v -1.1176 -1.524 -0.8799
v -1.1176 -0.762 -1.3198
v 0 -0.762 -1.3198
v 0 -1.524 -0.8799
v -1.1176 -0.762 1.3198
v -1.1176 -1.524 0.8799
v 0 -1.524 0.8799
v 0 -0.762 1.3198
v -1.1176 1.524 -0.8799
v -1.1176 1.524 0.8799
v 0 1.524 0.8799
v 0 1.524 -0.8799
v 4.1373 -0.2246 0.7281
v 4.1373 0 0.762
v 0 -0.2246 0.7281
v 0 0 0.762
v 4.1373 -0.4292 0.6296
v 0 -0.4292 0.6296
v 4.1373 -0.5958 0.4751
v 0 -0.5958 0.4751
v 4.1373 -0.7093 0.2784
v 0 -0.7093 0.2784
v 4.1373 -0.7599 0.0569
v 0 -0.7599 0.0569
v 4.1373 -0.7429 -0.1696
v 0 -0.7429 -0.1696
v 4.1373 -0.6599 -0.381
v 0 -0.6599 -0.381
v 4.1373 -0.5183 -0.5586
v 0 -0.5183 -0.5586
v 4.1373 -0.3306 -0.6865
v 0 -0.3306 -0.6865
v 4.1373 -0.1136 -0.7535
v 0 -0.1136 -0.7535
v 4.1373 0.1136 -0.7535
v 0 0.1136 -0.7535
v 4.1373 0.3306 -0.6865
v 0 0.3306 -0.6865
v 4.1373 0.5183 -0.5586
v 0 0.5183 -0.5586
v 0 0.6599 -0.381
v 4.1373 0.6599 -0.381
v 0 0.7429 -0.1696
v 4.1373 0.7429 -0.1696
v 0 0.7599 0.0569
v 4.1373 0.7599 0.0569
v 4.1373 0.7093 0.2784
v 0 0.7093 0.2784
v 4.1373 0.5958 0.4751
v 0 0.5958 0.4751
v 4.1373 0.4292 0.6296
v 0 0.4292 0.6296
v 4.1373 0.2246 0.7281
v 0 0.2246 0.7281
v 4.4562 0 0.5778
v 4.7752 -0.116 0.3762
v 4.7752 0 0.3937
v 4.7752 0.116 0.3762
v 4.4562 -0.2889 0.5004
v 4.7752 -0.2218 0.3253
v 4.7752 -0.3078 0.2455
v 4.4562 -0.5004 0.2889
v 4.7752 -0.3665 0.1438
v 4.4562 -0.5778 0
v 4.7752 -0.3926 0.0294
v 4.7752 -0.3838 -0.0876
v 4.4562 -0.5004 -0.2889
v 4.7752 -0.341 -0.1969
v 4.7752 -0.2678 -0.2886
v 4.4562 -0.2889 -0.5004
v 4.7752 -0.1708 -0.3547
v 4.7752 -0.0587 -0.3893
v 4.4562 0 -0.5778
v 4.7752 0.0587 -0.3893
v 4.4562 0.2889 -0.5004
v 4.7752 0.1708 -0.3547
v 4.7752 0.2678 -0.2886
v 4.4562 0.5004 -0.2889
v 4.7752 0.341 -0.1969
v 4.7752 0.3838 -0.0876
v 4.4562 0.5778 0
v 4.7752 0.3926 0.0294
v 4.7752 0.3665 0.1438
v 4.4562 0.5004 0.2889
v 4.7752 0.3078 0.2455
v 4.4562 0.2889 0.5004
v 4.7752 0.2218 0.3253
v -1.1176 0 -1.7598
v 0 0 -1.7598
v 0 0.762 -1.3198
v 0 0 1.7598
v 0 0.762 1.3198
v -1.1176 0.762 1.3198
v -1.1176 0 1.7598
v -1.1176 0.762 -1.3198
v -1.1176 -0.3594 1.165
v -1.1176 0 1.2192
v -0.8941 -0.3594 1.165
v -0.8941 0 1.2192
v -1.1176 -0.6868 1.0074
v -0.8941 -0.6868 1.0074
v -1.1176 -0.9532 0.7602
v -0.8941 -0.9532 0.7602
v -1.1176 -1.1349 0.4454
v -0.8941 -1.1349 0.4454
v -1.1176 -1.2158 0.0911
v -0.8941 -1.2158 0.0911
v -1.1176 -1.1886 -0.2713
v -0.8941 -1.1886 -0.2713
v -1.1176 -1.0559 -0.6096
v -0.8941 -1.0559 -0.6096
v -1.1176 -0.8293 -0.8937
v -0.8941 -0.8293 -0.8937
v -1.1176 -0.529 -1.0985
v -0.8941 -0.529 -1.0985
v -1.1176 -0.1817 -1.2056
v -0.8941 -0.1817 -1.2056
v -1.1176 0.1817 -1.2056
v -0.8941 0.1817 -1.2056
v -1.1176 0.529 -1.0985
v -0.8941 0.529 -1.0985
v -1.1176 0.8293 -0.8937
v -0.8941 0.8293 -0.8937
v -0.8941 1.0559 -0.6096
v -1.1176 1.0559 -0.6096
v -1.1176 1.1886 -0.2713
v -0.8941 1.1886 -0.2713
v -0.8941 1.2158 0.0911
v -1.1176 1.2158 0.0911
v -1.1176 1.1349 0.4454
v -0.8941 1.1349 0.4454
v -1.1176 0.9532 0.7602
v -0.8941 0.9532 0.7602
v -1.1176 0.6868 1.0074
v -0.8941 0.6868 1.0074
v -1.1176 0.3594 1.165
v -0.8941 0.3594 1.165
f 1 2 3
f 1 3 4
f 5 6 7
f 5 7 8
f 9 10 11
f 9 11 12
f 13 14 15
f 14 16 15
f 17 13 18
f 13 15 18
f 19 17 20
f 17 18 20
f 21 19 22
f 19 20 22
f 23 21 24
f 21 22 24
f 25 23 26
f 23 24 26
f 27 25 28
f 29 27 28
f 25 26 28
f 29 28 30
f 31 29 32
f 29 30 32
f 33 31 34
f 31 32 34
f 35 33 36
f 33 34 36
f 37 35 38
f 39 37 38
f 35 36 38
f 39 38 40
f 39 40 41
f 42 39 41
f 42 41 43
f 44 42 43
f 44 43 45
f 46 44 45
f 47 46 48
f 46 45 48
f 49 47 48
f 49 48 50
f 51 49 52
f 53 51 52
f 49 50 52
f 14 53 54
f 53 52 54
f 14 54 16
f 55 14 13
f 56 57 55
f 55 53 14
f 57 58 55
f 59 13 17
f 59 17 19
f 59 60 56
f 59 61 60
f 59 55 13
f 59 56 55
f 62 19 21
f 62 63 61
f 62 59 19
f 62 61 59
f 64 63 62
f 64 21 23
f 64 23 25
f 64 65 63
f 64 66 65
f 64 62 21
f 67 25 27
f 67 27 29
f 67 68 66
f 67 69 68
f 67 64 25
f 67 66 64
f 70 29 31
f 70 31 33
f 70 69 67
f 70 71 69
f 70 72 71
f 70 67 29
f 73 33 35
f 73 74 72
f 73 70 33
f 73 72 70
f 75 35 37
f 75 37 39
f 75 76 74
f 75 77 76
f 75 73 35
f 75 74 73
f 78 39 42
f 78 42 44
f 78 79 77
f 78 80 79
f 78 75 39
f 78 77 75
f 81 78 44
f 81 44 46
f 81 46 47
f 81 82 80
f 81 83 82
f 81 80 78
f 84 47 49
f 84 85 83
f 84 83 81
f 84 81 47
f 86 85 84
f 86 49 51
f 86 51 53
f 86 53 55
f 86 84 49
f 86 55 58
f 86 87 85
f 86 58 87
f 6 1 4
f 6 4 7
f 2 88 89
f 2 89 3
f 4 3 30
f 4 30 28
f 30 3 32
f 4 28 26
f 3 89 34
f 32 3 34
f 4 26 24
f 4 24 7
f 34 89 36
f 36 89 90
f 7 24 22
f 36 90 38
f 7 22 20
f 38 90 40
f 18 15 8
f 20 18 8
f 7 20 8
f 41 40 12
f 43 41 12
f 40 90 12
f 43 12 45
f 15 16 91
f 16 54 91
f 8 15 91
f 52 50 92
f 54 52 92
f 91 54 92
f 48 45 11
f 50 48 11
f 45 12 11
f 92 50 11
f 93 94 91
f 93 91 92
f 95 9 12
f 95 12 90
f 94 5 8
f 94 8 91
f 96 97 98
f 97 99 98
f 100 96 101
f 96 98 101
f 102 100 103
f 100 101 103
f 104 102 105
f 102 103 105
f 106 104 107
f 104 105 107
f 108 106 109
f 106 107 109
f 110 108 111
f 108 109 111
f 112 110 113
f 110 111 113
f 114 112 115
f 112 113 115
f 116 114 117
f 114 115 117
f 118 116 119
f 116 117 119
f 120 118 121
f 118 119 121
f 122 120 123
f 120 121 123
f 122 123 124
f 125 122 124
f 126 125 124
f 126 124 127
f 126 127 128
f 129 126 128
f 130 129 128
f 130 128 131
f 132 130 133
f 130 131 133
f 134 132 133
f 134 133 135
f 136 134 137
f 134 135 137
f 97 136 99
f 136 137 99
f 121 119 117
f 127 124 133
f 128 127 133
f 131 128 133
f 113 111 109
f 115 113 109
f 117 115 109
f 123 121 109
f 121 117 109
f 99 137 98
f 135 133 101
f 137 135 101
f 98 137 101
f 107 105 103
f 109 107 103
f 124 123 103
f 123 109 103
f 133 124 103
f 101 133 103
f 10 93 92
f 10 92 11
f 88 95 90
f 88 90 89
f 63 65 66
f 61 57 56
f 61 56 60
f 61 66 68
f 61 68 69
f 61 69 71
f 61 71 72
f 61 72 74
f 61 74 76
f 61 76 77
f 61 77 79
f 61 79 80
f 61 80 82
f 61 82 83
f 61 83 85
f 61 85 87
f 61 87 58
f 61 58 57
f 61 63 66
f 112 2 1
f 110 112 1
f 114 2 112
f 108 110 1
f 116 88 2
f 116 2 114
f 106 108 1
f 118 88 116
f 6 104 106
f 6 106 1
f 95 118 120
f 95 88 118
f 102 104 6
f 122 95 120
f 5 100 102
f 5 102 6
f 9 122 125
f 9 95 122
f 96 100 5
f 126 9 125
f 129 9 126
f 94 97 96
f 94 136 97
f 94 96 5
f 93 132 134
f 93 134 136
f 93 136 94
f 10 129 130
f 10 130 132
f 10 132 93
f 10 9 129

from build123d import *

# Parameters (mm, degrees)
EXTRUDE1_DEPTH = 1.1176


with BuildPart() as part:
    # Sketch1 → base-Revolve (revolve)
    with BuildSketch(Plane.XY, mode=Mode.PRIVATE) as base_revolve_sk:
        Polygon((0, 0.762), (0, 1.524), (-1.1176, 1.524), (-1.1176, 1.2192), (-0.89408, 1.2192), (-0.89408, 0), (0, 0), (4.7752, 0), (4.7752, 0.762), align=None)
    revolve(base_revolve_sk.sketch.rotate(Axis((0, 0, 0), (1, 0, 0)), 90), axis=Axis((0, 0, 0), (1, 0, 0)))

    # Sketch15 → Extrude1 (add)
    with BuildSketch(Plane.ZY.offset(1.1176)):
        with BuildLine():
            ThreePointArc((-1.319822717, -0.761999997), (-1.524, 6e-09), (-1.319822711, 0.762000008))
            Line((-1.319822711, 0.762000008), (-1.75976362, 0))
            Line((-1.75976362, 0), (-1.319822717, -0.761999997))
        make_face()
        with BuildLine():
            ThreePointArc((-1.319822711, 0.762000008), (-0.761999998, 1.319822717), (-5e-09, 1.524))
            Line((-5e-09, 1.524), (-0.87988181, 1.524))
            Line((-0.87988181, 1.524), (-1.319822711, 0.762000008))
        make_face()
        with BuildLine():
            ThreePointArc((-5e-09, 1.524), (0.761999979, 1.319822727), (1.319822694, 0.762000038))
            Line((1.319822694, 0.762000038), (0.87988181, 1.524))
            Line((0.87988181, 1.524), (-5e-09, 1.524))
        make_face()
        with BuildLine():
            Line((1.319822721, -0.76199999), (1.75976362, 0))
            Line((1.75976362, 0), (1.319822694, 0.762000038))
            ThreePointArc((1.319822694, 0.762000038), (1.472070954, 0.394440246), (1.524, 0))
            ThreePointArc((1.524, 0), (1.472070961, -0.394440219), (1.319822721, -0.76199999))
        make_face()
        with BuildLine():
            Line((0.87988181, -1.524), (1.319822721, -0.76199999))
            ThreePointArc((1.319822721, -0.76199999), (0.762000003, -1.319822714), (-5e-09, -1.524))
            Line((-5e-09, -1.524), (0.87988181, -1.524))
        make_face()
        with BuildLine():
            Line((-0.87988181, -1.524), (-5e-09, -1.524))
            ThreePointArc((-5e-09, -1.524), (-0.762000004, -1.319822713), (-1.319822717, -0.761999997))
            Line((-1.319822717, -0.761999997), (-0.87988181, -1.524))
        make_face()
    extrude(amount=-EXTRUDE1_DEPTH)

    # Sketch8 → point_Cut-Revolve1 (revolve, cut)
    with BuildSketch(Plane.XY, mode=Mode.PRIVATE) as point_cut_revolve1_sk:
        Polygon((4.7752, 0), (5.2832, 0), (5.2832, 1.27), (4.137285688, 1.27), (4.137285688, 0.762), (4.7752, 0.3937), align=None)
    revolve(point_cut_revolve1_sk.sketch.rotate(Axis((0, 0, 0), (1, 0, 0)), 90), axis=Axis((0, 0, 0), (1, 0, 0)), mode=Mode.SUBTRACT)


solid = part.part
